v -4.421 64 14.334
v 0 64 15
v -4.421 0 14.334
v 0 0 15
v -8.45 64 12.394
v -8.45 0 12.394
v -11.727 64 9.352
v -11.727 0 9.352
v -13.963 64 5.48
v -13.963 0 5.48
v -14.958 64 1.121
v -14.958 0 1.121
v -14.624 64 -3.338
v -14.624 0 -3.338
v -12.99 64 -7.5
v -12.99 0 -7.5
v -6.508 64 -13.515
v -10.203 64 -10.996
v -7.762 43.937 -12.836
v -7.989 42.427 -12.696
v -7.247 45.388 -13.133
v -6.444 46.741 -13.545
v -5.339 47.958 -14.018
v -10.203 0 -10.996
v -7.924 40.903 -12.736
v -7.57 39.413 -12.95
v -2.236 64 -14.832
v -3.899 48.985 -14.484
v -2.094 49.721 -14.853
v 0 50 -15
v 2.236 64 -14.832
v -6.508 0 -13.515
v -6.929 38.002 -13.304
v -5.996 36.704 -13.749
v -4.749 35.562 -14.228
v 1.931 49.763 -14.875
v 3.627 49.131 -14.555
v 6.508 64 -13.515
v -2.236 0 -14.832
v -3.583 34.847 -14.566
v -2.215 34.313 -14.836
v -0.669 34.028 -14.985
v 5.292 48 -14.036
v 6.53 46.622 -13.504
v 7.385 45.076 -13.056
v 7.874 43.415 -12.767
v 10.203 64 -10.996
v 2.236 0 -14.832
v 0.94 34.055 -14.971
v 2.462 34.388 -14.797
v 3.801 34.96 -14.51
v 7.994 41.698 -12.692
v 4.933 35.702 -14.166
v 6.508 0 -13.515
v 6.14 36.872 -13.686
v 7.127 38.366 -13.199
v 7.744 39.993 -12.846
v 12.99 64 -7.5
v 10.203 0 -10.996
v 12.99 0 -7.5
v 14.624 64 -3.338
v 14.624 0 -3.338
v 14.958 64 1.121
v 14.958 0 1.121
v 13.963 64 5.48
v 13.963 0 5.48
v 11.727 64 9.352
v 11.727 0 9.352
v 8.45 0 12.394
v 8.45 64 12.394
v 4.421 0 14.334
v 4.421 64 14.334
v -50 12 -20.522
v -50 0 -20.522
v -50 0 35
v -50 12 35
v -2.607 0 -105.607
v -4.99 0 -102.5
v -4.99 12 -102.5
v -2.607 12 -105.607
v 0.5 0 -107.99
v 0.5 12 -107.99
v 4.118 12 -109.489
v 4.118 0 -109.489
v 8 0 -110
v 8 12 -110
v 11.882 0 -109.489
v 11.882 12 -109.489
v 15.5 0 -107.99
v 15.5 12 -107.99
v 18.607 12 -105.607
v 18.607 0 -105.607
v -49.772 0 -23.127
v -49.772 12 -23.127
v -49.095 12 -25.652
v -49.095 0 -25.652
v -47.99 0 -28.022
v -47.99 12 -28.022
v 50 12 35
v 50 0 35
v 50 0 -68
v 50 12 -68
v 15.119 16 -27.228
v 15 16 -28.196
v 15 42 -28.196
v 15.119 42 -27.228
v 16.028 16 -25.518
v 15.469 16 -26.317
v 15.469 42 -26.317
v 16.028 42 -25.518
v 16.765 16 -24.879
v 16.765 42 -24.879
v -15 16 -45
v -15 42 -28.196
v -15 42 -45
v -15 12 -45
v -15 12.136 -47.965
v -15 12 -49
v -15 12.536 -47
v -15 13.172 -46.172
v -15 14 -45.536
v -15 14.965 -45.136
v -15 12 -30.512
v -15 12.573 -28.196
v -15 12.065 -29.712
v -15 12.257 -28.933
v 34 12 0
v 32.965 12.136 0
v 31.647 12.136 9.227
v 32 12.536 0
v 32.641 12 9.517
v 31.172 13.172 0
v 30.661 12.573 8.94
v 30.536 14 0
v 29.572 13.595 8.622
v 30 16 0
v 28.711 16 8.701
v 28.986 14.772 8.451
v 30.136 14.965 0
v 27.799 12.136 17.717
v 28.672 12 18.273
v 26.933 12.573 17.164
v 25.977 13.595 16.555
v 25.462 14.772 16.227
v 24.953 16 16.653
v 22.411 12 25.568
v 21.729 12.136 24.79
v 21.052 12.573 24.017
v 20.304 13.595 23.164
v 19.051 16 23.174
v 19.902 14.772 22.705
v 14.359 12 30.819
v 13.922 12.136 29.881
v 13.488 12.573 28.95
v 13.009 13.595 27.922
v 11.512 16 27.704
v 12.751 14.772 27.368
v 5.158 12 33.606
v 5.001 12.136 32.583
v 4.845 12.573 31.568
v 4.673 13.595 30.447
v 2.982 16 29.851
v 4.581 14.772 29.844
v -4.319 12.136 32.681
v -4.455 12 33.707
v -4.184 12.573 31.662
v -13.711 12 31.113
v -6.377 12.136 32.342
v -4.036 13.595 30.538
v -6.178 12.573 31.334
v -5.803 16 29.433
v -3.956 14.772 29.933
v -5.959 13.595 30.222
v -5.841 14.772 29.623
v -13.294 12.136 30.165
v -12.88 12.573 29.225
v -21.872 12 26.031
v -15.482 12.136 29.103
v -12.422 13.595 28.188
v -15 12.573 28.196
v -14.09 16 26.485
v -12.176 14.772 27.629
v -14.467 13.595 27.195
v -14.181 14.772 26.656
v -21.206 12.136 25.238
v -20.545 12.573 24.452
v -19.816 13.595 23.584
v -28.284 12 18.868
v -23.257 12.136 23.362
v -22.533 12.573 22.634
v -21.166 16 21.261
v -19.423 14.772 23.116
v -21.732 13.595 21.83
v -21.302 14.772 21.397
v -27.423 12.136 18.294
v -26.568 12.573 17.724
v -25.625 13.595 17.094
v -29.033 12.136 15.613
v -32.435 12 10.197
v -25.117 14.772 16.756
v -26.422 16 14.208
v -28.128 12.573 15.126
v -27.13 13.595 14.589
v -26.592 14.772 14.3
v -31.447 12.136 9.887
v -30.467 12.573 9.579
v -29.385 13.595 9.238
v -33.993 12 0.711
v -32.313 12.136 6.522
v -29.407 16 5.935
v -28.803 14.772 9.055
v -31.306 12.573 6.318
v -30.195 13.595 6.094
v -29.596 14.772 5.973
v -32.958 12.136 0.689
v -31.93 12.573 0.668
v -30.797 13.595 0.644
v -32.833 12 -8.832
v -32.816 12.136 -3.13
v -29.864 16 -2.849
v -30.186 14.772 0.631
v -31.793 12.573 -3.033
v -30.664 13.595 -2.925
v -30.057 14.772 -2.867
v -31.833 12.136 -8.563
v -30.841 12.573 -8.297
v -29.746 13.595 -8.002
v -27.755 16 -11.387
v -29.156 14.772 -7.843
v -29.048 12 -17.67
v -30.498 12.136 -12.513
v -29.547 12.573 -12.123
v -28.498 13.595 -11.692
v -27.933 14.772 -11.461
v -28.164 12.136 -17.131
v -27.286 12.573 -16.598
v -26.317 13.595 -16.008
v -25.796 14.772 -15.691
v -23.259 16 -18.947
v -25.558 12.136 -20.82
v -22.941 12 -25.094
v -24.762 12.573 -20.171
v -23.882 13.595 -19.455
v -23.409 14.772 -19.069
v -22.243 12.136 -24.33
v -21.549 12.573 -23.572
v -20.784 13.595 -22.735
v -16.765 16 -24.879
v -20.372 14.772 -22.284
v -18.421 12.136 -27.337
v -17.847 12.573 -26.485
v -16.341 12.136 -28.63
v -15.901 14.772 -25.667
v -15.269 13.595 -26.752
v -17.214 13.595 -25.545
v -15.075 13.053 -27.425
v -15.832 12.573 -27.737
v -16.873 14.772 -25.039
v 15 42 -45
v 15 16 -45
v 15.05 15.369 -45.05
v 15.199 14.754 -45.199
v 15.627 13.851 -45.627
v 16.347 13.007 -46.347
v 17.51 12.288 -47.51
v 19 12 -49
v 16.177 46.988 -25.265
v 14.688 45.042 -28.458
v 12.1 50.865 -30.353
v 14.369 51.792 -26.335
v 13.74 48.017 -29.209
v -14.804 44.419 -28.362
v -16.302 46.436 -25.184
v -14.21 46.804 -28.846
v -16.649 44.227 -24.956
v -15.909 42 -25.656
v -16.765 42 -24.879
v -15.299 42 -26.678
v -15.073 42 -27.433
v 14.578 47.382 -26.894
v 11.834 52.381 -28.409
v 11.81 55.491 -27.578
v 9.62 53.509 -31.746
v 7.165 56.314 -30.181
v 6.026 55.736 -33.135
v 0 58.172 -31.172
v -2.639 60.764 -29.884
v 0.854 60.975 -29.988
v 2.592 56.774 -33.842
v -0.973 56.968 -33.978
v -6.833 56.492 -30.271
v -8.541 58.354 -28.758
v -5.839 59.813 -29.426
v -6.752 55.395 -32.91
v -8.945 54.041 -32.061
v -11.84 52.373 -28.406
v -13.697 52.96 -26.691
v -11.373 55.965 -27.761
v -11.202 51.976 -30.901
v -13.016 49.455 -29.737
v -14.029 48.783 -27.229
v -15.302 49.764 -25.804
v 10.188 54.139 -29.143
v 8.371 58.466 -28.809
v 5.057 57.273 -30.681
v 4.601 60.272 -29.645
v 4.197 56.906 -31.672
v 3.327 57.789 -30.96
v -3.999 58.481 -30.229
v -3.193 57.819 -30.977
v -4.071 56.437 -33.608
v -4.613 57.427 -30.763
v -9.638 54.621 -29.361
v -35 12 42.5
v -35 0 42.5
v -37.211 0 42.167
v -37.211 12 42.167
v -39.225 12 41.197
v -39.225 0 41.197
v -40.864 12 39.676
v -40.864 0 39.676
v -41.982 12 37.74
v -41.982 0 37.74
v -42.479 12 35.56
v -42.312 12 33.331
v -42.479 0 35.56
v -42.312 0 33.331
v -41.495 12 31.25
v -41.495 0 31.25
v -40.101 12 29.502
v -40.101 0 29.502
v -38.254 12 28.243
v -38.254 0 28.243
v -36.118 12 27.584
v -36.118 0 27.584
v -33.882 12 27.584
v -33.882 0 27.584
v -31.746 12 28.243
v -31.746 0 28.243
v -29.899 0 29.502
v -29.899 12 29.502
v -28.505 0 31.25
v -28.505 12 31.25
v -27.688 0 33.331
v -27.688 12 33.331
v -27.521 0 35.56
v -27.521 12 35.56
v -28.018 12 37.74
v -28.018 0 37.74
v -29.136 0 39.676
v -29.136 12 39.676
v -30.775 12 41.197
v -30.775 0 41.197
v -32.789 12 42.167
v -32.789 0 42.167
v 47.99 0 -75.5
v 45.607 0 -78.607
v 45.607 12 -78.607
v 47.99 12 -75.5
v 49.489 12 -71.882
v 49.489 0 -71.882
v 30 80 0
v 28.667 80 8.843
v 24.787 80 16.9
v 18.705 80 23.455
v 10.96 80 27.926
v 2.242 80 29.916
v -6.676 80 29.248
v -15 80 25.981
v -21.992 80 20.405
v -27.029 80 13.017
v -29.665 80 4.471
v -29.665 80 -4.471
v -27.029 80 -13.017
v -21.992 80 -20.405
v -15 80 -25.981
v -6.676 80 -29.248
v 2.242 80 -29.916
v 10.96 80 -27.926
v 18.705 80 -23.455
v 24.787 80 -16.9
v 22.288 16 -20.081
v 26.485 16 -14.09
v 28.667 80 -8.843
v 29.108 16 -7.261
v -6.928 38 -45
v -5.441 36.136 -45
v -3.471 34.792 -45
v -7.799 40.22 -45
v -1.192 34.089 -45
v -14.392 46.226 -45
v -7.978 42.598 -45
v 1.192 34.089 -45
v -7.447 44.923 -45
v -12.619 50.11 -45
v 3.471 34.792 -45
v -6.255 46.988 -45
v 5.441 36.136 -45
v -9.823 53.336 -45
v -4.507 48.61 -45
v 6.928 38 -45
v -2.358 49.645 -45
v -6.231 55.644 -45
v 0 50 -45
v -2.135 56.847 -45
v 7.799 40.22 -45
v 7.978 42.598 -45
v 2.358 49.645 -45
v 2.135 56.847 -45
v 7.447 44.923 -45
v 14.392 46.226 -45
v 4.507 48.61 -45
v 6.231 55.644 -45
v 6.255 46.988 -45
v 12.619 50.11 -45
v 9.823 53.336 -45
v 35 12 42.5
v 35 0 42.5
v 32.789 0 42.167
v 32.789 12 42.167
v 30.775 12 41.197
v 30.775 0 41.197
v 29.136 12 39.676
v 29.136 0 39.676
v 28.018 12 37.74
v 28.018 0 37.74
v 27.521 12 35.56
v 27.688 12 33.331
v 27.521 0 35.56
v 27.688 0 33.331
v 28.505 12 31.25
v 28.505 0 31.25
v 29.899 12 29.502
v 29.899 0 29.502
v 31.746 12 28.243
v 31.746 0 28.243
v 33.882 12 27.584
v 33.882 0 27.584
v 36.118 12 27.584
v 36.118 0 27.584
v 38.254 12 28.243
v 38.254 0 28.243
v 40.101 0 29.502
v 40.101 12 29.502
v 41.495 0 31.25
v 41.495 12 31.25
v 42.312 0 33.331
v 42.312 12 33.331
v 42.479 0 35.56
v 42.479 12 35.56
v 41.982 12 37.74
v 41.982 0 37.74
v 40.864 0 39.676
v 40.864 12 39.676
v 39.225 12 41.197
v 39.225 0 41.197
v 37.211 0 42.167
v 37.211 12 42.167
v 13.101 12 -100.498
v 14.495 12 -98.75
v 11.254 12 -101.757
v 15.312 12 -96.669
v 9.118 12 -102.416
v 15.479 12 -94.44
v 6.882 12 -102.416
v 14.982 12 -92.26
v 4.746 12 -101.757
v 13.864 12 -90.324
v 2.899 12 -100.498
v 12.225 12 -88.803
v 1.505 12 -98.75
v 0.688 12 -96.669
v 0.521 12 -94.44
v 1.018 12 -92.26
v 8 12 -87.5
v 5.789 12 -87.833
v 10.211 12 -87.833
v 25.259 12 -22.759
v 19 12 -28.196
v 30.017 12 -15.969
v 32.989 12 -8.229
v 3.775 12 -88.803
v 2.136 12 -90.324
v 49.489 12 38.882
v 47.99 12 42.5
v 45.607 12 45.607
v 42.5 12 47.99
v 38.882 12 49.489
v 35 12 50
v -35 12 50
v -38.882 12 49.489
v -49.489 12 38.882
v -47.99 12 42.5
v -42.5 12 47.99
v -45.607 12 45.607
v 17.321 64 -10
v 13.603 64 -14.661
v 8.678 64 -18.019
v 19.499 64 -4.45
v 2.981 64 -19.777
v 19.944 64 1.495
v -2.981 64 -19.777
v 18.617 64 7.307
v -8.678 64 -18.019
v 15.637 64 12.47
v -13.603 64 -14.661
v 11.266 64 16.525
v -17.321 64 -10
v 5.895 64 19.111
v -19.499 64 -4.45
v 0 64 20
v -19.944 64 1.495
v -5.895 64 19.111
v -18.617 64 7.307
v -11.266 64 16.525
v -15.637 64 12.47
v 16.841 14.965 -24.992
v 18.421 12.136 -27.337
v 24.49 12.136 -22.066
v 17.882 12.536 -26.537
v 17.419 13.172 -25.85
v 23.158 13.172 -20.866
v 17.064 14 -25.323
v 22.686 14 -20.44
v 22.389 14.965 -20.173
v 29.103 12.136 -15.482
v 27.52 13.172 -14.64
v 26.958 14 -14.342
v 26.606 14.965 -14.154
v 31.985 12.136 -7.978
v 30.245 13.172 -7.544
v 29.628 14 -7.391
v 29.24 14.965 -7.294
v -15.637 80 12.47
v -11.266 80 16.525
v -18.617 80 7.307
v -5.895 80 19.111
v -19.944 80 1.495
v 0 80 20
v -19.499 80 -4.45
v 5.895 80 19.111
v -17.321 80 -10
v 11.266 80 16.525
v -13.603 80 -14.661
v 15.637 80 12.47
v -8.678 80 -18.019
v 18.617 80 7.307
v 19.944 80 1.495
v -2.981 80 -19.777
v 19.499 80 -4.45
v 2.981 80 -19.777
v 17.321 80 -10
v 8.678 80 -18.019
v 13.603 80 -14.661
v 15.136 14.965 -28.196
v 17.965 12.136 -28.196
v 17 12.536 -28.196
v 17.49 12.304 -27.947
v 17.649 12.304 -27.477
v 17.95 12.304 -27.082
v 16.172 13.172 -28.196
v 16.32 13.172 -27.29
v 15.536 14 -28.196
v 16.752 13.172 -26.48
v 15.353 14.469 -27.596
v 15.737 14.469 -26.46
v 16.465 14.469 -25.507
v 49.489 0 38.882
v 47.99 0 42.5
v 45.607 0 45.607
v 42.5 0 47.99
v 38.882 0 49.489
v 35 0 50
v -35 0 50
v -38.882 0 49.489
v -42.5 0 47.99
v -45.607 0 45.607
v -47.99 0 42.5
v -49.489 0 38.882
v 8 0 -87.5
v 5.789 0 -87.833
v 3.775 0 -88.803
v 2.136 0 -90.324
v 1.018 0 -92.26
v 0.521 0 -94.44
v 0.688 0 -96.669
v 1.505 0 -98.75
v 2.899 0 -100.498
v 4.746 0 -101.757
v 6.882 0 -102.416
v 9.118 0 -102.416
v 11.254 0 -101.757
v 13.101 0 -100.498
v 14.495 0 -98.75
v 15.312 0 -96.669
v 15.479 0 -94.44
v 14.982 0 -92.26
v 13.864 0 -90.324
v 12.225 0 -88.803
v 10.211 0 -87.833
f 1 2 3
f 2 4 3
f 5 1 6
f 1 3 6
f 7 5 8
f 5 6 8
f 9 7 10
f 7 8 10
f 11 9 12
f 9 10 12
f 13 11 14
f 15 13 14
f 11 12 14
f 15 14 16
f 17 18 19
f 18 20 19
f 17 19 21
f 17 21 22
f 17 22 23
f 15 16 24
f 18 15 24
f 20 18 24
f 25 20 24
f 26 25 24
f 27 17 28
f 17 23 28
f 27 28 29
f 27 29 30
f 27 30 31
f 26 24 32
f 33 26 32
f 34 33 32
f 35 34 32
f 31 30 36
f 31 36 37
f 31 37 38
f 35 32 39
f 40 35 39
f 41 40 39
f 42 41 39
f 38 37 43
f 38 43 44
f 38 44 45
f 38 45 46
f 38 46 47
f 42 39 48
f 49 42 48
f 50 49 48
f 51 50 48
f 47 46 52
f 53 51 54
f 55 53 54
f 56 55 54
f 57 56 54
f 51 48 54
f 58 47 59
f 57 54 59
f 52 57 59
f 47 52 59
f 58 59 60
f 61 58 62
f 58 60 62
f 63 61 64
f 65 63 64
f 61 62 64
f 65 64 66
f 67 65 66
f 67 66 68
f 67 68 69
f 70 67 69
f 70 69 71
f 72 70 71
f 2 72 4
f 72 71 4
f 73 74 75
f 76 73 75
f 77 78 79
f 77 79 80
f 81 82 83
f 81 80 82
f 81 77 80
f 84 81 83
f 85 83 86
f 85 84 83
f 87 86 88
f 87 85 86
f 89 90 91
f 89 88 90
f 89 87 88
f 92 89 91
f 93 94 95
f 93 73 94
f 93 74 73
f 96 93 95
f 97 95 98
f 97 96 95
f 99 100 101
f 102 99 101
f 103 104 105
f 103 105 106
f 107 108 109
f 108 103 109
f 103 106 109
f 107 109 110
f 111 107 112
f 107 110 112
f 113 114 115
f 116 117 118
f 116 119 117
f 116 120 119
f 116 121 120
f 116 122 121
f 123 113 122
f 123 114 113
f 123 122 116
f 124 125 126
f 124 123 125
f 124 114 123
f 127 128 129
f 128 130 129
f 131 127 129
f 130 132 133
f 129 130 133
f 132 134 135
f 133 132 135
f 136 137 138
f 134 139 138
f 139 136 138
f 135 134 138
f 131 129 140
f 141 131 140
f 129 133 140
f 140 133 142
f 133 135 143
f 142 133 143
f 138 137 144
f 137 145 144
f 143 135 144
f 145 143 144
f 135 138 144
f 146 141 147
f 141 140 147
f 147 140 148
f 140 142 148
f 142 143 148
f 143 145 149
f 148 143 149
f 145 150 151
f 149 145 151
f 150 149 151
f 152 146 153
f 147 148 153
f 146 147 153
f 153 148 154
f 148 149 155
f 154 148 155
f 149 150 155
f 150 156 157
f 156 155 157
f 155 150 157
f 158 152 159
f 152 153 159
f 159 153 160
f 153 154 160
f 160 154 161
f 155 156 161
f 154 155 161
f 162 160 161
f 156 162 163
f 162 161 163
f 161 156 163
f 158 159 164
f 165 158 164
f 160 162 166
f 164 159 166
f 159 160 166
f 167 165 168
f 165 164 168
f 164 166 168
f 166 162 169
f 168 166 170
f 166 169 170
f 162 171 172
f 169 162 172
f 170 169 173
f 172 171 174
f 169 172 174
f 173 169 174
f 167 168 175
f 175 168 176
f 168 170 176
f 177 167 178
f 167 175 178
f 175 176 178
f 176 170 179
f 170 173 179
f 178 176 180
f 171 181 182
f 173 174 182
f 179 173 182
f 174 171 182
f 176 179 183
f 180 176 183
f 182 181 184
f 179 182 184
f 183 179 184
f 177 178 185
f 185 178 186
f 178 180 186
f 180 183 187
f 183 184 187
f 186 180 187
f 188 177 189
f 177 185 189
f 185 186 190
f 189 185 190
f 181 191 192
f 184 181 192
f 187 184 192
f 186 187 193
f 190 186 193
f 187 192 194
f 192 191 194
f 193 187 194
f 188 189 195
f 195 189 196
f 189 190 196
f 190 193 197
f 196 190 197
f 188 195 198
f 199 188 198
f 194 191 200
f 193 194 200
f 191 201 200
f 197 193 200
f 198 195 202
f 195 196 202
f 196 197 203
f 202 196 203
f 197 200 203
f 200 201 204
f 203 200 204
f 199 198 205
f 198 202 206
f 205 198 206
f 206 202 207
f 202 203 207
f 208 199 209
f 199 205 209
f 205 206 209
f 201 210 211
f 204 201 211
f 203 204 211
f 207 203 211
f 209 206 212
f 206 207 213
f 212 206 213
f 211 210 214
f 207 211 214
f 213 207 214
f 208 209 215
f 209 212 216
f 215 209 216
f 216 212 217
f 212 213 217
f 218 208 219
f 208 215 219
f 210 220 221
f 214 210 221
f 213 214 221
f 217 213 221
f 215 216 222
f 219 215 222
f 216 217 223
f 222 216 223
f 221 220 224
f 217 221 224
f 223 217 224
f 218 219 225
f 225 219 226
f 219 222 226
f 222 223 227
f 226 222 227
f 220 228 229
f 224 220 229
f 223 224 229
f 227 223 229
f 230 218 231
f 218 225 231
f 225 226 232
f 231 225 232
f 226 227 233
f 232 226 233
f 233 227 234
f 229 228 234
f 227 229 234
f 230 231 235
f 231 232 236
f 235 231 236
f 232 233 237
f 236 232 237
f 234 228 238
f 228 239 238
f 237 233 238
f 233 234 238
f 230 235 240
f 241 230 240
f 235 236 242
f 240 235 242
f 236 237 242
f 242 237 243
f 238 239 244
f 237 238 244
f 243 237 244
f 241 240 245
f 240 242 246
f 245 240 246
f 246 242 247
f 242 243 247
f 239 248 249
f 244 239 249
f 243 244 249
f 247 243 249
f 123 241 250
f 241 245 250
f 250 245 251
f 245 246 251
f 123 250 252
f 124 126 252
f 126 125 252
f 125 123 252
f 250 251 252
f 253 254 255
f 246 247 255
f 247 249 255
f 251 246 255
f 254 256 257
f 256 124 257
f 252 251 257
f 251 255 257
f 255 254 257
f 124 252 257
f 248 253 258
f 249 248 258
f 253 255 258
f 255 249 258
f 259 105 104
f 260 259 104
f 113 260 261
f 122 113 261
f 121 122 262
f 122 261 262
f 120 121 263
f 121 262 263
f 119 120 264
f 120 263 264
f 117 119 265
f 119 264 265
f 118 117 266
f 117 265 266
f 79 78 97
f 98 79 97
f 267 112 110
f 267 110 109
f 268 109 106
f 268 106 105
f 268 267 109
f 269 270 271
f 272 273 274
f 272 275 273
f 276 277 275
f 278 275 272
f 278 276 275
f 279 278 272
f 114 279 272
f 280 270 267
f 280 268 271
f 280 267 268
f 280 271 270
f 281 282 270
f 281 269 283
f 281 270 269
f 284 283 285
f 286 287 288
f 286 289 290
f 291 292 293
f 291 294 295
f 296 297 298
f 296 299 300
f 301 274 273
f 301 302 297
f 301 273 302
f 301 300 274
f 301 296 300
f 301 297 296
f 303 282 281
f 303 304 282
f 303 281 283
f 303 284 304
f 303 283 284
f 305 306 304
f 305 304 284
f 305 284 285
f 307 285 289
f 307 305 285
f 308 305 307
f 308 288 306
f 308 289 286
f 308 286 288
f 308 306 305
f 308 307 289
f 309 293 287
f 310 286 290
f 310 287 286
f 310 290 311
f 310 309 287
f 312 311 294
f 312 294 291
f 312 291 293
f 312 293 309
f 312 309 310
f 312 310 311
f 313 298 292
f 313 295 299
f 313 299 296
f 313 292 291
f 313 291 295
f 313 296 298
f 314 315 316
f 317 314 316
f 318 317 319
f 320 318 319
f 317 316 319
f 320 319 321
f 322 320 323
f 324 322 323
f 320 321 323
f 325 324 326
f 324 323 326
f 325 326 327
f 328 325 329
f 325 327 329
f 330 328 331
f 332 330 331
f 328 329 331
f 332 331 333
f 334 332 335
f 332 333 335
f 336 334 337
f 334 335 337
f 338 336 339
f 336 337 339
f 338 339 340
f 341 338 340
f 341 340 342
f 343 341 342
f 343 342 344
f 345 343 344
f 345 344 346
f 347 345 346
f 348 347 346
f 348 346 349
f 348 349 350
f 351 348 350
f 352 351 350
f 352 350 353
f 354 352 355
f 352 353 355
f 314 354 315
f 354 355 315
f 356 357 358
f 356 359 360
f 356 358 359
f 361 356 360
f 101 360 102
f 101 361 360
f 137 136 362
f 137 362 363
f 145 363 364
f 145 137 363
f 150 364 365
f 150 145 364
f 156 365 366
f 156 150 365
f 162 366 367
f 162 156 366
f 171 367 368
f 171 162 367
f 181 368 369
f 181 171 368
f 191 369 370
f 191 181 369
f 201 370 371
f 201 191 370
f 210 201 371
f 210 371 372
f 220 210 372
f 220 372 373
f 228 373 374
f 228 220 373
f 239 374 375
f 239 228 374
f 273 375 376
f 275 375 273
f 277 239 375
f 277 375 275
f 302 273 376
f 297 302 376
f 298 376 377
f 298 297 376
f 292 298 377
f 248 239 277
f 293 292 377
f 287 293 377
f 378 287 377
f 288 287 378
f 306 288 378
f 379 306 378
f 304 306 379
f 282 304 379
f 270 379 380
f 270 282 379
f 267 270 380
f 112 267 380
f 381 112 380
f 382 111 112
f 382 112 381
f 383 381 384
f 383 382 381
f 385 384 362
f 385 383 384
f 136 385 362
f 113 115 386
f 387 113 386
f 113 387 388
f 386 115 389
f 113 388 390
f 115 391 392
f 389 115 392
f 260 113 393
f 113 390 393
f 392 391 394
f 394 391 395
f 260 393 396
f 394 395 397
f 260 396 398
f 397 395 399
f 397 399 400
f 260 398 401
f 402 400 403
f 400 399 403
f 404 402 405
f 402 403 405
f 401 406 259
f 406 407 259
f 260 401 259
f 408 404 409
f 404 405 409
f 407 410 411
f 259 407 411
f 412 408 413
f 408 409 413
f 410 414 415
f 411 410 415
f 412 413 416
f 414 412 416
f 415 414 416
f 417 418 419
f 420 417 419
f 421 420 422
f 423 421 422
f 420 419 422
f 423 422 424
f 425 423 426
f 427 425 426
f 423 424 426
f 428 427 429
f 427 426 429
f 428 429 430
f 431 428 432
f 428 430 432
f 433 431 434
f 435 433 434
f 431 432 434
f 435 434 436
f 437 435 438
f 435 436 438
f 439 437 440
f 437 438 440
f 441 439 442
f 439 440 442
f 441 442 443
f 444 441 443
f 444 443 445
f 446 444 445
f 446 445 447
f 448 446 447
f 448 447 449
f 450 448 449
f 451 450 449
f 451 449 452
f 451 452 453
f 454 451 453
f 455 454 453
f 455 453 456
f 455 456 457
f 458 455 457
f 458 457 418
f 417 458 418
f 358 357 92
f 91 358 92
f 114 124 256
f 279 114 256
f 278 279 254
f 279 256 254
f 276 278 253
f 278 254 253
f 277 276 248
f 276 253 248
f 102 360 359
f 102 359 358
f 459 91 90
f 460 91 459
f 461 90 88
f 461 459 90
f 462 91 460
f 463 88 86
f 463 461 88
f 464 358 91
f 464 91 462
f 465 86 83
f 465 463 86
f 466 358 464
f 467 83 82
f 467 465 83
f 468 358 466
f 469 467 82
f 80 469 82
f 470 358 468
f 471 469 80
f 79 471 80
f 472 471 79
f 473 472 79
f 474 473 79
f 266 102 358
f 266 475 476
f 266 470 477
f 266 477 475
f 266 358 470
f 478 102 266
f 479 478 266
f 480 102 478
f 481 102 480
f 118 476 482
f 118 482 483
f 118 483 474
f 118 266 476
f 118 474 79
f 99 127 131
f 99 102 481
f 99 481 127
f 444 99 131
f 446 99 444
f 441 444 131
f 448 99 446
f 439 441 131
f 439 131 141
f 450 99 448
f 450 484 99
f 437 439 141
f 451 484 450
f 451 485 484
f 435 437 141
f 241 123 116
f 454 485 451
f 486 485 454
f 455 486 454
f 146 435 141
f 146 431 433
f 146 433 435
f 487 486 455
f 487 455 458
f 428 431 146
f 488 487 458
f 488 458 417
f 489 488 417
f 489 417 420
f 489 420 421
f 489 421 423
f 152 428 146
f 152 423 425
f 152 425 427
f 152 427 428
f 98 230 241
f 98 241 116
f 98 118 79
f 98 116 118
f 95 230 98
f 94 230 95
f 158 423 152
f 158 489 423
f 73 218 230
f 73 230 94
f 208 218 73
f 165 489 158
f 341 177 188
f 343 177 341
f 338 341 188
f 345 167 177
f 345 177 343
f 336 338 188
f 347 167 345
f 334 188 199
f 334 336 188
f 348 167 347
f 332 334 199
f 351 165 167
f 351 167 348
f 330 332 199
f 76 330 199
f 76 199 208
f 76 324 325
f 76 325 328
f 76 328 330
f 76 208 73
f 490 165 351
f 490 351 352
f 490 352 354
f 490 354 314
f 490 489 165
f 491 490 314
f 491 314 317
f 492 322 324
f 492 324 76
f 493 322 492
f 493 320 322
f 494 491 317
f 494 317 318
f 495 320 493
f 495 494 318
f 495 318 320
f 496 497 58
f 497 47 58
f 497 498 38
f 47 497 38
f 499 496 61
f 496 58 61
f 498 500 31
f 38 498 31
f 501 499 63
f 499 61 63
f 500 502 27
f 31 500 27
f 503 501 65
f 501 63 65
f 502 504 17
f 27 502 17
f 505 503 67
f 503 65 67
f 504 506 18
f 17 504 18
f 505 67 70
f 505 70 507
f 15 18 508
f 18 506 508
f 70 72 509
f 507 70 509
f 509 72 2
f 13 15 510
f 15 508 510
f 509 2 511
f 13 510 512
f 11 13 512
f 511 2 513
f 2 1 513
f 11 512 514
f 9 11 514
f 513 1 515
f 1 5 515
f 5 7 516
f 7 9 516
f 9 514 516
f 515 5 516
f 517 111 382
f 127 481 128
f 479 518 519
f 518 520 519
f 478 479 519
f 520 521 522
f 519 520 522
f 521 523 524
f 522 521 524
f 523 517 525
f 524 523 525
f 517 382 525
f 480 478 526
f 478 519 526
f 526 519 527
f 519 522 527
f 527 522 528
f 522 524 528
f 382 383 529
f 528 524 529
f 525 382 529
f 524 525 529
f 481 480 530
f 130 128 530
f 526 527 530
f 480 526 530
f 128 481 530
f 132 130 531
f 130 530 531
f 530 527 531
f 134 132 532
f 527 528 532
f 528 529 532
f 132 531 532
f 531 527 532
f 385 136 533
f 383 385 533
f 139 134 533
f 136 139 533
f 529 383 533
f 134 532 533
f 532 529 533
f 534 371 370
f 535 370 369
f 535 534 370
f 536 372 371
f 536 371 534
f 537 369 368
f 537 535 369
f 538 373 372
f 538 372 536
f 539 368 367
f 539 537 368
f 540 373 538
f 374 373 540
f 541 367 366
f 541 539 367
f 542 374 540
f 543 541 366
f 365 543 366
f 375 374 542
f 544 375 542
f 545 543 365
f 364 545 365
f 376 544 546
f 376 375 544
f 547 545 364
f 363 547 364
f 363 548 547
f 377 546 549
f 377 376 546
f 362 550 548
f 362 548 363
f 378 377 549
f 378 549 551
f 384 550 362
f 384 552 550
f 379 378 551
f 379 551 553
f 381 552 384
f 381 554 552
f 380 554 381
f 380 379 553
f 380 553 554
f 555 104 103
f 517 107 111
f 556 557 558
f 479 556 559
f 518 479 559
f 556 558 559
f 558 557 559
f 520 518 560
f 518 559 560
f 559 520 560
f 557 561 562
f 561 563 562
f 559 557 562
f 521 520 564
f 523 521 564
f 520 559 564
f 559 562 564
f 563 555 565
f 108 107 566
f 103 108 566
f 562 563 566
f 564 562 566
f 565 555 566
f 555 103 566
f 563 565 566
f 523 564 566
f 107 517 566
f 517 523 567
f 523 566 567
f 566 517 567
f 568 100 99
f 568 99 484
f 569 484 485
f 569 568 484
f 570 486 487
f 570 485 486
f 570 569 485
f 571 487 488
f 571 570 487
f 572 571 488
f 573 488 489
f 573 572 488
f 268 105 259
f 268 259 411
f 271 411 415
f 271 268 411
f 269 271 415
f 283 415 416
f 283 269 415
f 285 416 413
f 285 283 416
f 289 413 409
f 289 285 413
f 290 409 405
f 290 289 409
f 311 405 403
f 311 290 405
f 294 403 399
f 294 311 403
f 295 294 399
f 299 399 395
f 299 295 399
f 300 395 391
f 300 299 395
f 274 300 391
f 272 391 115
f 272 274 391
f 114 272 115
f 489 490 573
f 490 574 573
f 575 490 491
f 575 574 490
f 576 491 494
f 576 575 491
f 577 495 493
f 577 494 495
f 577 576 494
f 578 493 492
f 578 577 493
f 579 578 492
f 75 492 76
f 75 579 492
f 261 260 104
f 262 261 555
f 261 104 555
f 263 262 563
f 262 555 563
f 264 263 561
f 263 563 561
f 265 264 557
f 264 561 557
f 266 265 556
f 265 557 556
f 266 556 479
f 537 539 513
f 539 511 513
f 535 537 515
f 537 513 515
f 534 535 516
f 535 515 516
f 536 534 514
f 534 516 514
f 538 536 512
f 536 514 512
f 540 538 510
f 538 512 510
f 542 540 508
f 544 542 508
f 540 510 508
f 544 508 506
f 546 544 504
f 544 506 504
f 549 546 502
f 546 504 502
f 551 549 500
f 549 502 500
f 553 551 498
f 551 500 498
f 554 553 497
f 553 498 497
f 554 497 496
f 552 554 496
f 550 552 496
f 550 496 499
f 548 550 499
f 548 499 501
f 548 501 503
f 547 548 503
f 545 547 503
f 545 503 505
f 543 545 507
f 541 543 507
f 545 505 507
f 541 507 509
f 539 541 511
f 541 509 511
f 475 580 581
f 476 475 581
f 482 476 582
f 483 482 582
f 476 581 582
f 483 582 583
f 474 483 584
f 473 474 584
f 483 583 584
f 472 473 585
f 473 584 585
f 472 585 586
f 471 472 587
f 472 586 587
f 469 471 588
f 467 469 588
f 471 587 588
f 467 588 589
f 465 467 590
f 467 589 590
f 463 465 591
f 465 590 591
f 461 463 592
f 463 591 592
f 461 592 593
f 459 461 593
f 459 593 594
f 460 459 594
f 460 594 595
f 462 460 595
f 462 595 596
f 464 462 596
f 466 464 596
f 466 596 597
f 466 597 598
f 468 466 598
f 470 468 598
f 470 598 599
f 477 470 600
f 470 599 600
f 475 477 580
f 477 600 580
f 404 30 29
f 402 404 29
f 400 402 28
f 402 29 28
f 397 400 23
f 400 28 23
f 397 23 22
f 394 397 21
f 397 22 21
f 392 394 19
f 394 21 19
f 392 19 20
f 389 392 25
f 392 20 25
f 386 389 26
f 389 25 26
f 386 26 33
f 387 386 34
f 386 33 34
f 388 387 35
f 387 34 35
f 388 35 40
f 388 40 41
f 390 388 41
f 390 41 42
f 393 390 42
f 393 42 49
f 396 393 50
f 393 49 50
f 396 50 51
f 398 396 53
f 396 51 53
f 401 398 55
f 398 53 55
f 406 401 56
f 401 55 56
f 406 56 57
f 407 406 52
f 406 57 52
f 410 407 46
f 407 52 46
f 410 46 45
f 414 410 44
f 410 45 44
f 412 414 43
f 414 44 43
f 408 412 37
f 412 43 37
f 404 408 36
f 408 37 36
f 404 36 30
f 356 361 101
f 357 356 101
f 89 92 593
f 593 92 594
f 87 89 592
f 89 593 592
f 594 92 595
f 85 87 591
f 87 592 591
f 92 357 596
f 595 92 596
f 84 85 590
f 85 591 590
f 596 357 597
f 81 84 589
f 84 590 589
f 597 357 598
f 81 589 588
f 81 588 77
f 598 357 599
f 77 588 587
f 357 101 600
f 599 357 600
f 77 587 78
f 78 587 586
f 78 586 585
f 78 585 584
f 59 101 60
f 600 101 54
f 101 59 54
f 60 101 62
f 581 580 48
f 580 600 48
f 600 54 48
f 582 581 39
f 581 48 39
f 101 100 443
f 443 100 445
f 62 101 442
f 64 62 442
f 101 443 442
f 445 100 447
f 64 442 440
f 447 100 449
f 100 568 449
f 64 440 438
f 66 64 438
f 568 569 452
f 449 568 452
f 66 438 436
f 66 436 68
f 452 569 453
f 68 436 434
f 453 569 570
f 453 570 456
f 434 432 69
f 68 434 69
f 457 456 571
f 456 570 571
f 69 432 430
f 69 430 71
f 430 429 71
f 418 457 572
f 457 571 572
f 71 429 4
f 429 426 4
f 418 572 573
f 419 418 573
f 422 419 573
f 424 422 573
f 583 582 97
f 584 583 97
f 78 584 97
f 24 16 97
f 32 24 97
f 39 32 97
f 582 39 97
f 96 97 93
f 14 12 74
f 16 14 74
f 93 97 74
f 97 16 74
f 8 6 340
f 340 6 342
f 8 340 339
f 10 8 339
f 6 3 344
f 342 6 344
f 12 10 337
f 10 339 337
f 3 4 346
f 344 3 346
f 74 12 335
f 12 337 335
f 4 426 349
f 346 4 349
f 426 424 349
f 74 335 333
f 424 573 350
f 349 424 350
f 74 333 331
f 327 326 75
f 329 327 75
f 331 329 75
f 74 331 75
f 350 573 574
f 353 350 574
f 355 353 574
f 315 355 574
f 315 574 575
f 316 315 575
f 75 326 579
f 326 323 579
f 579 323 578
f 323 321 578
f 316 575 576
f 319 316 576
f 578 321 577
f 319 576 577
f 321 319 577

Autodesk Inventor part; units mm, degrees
ref_plane "YZ Plane" through (0, 0, 0) normal (1, 0, 0) x (0, 1, 0)
ref_plane "XZ Plane" through (0, 0, 0) normal (0, 1, 0) x (-1, 0, 0)
ref_plane "XY Plane" through (0, 0, 0) normal (0, 0, 1) x (1, 0, 0)
sketch "Sketch1" plane through (0, 0, 0) normal (0, 1, 0) x (-1, 0, 0)
  line L0 (35, 50) -> (-35, 50)
  line L1 (-50, 35) -> (-50, -68)
  line L2 (-45.6066, -78.6066) -> (-18.6066, -105.6066)
  line L3 (4.9904, -102.5) -> (47.9904, -28.0218)
  line L4 (50, -20.5218) -> (50, 35)
  line L5 (0, -144.3313) -> (0, 86.0129) construction
  arc A0 (-18.6066, -105.6066) -> (4.9904, -102.5) centre (-8, -95) ccw
  arc A1 (47.9904, -28.0218) -> (50, -20.5218) centre (35, -20.5218) ccw
  arc A2 (50, 35) -> (35, 50) centre (35, 35) ccw
  arc A3 (-35, 50) -> (-50, 35) centre (-35, 35) ccw
  arc A4 (-50, -68) -> (-45.6066, -78.6066) centre (-35, -68) ccw
  point P0 (0, 0)
  point P1 (50, 50)
  point P2 (-50, 50)
  point P3 (0, 50)
  dimension "d0" = 100
  dimension "d1" = 50
  dimension "d2" = 135
  dimension "d3" = 15
  dimension "d4" = 42
  dimension "d5" = 145
  dimension "d6" = 30
  dimension "d7" = 15
extrude "Extrusion1" add sketch "Sketch1" along normal blind 12
sketch "Sketch2" plane through (0, 12, 0) normal (0, 1, 0) x (1, 0, 0)
  arc A0 (35, -50) -> (50, -35) centre (35, -35) ccw projected
  arc A1 (-50, -35) -> (-35, -50) centre (-35, -35) ccw projected
  arc A2 (18.6066, 105.6066) -> (-4.9904, 102.5) centre (8, 95) ccw projected
  point P0 (0, 0)
hole "Hole1" at (35, 12, 35) at (-35, 12, 35) at (8, 12, -95) direction (0, -1, 0) diameter 15 end through all
sketch "Sketch3" plane through (0, 12, 0) normal (0, 1, 0) x (1, 0, 0)
  circle A0 centre (0, 0) radius 30
  dimension "d17" = 60
extrude "Extrusion2" add sketch "Sketch3" along normal blind 68
sketch "Sketch5" plane through (0, 0, 0) normal (0, 0, 1) x (1, 0, 0)
  arc A0 (15, 42) -> (-15, 42) centre (0, 42) ccw
  line L0 (15, 42) -> (15, 0)
  line L1 (-15, 42) -> (-15, 0)
  line L2 (15, 0) -> (-15, 0)
  line L3 (-70, 0) -> (70, 0) construction
  point P0 (0, 0)
  dimension "d39" = 30
  dimension "d41" = 42
extrude "Extrusion4" add sketch "Sketch5" against normal blind 45
sketch "Sketch6" plane through (0, 80, 0) normal (0, 1, 0) x (1, 0, 0)
  circle A0 centre (0, 0) radius 30 projected
hole "Hole3" at (0, 80, 0) direction (0, -1, 0) diameter 30 end through all counterbore diameter 40 counterbore depth 16
sketch "Sketch7" plane through (0, 0, -45) normal (0, 0, -1) x (-1, 0, 0)
  arc A0 (15, 42) -> (-15, 42) centre (0, 42) ccw projected
  point P0 (0, 0)
hole "Hole4" at (0, 42, -45) direction (0, 0, 1) diameter 16 end up to surface
fillet "Fillet1" radius 4 7 edges at (25.9808, 12, -15) (-15, 12, 25.9808) (15, 12, -35.4904) (-15, 27, -25.9808) (15, 27, -25.9808) (-0.0148, 57, -30) (0, 12, -45)
properties material "Steel, Carbon"
